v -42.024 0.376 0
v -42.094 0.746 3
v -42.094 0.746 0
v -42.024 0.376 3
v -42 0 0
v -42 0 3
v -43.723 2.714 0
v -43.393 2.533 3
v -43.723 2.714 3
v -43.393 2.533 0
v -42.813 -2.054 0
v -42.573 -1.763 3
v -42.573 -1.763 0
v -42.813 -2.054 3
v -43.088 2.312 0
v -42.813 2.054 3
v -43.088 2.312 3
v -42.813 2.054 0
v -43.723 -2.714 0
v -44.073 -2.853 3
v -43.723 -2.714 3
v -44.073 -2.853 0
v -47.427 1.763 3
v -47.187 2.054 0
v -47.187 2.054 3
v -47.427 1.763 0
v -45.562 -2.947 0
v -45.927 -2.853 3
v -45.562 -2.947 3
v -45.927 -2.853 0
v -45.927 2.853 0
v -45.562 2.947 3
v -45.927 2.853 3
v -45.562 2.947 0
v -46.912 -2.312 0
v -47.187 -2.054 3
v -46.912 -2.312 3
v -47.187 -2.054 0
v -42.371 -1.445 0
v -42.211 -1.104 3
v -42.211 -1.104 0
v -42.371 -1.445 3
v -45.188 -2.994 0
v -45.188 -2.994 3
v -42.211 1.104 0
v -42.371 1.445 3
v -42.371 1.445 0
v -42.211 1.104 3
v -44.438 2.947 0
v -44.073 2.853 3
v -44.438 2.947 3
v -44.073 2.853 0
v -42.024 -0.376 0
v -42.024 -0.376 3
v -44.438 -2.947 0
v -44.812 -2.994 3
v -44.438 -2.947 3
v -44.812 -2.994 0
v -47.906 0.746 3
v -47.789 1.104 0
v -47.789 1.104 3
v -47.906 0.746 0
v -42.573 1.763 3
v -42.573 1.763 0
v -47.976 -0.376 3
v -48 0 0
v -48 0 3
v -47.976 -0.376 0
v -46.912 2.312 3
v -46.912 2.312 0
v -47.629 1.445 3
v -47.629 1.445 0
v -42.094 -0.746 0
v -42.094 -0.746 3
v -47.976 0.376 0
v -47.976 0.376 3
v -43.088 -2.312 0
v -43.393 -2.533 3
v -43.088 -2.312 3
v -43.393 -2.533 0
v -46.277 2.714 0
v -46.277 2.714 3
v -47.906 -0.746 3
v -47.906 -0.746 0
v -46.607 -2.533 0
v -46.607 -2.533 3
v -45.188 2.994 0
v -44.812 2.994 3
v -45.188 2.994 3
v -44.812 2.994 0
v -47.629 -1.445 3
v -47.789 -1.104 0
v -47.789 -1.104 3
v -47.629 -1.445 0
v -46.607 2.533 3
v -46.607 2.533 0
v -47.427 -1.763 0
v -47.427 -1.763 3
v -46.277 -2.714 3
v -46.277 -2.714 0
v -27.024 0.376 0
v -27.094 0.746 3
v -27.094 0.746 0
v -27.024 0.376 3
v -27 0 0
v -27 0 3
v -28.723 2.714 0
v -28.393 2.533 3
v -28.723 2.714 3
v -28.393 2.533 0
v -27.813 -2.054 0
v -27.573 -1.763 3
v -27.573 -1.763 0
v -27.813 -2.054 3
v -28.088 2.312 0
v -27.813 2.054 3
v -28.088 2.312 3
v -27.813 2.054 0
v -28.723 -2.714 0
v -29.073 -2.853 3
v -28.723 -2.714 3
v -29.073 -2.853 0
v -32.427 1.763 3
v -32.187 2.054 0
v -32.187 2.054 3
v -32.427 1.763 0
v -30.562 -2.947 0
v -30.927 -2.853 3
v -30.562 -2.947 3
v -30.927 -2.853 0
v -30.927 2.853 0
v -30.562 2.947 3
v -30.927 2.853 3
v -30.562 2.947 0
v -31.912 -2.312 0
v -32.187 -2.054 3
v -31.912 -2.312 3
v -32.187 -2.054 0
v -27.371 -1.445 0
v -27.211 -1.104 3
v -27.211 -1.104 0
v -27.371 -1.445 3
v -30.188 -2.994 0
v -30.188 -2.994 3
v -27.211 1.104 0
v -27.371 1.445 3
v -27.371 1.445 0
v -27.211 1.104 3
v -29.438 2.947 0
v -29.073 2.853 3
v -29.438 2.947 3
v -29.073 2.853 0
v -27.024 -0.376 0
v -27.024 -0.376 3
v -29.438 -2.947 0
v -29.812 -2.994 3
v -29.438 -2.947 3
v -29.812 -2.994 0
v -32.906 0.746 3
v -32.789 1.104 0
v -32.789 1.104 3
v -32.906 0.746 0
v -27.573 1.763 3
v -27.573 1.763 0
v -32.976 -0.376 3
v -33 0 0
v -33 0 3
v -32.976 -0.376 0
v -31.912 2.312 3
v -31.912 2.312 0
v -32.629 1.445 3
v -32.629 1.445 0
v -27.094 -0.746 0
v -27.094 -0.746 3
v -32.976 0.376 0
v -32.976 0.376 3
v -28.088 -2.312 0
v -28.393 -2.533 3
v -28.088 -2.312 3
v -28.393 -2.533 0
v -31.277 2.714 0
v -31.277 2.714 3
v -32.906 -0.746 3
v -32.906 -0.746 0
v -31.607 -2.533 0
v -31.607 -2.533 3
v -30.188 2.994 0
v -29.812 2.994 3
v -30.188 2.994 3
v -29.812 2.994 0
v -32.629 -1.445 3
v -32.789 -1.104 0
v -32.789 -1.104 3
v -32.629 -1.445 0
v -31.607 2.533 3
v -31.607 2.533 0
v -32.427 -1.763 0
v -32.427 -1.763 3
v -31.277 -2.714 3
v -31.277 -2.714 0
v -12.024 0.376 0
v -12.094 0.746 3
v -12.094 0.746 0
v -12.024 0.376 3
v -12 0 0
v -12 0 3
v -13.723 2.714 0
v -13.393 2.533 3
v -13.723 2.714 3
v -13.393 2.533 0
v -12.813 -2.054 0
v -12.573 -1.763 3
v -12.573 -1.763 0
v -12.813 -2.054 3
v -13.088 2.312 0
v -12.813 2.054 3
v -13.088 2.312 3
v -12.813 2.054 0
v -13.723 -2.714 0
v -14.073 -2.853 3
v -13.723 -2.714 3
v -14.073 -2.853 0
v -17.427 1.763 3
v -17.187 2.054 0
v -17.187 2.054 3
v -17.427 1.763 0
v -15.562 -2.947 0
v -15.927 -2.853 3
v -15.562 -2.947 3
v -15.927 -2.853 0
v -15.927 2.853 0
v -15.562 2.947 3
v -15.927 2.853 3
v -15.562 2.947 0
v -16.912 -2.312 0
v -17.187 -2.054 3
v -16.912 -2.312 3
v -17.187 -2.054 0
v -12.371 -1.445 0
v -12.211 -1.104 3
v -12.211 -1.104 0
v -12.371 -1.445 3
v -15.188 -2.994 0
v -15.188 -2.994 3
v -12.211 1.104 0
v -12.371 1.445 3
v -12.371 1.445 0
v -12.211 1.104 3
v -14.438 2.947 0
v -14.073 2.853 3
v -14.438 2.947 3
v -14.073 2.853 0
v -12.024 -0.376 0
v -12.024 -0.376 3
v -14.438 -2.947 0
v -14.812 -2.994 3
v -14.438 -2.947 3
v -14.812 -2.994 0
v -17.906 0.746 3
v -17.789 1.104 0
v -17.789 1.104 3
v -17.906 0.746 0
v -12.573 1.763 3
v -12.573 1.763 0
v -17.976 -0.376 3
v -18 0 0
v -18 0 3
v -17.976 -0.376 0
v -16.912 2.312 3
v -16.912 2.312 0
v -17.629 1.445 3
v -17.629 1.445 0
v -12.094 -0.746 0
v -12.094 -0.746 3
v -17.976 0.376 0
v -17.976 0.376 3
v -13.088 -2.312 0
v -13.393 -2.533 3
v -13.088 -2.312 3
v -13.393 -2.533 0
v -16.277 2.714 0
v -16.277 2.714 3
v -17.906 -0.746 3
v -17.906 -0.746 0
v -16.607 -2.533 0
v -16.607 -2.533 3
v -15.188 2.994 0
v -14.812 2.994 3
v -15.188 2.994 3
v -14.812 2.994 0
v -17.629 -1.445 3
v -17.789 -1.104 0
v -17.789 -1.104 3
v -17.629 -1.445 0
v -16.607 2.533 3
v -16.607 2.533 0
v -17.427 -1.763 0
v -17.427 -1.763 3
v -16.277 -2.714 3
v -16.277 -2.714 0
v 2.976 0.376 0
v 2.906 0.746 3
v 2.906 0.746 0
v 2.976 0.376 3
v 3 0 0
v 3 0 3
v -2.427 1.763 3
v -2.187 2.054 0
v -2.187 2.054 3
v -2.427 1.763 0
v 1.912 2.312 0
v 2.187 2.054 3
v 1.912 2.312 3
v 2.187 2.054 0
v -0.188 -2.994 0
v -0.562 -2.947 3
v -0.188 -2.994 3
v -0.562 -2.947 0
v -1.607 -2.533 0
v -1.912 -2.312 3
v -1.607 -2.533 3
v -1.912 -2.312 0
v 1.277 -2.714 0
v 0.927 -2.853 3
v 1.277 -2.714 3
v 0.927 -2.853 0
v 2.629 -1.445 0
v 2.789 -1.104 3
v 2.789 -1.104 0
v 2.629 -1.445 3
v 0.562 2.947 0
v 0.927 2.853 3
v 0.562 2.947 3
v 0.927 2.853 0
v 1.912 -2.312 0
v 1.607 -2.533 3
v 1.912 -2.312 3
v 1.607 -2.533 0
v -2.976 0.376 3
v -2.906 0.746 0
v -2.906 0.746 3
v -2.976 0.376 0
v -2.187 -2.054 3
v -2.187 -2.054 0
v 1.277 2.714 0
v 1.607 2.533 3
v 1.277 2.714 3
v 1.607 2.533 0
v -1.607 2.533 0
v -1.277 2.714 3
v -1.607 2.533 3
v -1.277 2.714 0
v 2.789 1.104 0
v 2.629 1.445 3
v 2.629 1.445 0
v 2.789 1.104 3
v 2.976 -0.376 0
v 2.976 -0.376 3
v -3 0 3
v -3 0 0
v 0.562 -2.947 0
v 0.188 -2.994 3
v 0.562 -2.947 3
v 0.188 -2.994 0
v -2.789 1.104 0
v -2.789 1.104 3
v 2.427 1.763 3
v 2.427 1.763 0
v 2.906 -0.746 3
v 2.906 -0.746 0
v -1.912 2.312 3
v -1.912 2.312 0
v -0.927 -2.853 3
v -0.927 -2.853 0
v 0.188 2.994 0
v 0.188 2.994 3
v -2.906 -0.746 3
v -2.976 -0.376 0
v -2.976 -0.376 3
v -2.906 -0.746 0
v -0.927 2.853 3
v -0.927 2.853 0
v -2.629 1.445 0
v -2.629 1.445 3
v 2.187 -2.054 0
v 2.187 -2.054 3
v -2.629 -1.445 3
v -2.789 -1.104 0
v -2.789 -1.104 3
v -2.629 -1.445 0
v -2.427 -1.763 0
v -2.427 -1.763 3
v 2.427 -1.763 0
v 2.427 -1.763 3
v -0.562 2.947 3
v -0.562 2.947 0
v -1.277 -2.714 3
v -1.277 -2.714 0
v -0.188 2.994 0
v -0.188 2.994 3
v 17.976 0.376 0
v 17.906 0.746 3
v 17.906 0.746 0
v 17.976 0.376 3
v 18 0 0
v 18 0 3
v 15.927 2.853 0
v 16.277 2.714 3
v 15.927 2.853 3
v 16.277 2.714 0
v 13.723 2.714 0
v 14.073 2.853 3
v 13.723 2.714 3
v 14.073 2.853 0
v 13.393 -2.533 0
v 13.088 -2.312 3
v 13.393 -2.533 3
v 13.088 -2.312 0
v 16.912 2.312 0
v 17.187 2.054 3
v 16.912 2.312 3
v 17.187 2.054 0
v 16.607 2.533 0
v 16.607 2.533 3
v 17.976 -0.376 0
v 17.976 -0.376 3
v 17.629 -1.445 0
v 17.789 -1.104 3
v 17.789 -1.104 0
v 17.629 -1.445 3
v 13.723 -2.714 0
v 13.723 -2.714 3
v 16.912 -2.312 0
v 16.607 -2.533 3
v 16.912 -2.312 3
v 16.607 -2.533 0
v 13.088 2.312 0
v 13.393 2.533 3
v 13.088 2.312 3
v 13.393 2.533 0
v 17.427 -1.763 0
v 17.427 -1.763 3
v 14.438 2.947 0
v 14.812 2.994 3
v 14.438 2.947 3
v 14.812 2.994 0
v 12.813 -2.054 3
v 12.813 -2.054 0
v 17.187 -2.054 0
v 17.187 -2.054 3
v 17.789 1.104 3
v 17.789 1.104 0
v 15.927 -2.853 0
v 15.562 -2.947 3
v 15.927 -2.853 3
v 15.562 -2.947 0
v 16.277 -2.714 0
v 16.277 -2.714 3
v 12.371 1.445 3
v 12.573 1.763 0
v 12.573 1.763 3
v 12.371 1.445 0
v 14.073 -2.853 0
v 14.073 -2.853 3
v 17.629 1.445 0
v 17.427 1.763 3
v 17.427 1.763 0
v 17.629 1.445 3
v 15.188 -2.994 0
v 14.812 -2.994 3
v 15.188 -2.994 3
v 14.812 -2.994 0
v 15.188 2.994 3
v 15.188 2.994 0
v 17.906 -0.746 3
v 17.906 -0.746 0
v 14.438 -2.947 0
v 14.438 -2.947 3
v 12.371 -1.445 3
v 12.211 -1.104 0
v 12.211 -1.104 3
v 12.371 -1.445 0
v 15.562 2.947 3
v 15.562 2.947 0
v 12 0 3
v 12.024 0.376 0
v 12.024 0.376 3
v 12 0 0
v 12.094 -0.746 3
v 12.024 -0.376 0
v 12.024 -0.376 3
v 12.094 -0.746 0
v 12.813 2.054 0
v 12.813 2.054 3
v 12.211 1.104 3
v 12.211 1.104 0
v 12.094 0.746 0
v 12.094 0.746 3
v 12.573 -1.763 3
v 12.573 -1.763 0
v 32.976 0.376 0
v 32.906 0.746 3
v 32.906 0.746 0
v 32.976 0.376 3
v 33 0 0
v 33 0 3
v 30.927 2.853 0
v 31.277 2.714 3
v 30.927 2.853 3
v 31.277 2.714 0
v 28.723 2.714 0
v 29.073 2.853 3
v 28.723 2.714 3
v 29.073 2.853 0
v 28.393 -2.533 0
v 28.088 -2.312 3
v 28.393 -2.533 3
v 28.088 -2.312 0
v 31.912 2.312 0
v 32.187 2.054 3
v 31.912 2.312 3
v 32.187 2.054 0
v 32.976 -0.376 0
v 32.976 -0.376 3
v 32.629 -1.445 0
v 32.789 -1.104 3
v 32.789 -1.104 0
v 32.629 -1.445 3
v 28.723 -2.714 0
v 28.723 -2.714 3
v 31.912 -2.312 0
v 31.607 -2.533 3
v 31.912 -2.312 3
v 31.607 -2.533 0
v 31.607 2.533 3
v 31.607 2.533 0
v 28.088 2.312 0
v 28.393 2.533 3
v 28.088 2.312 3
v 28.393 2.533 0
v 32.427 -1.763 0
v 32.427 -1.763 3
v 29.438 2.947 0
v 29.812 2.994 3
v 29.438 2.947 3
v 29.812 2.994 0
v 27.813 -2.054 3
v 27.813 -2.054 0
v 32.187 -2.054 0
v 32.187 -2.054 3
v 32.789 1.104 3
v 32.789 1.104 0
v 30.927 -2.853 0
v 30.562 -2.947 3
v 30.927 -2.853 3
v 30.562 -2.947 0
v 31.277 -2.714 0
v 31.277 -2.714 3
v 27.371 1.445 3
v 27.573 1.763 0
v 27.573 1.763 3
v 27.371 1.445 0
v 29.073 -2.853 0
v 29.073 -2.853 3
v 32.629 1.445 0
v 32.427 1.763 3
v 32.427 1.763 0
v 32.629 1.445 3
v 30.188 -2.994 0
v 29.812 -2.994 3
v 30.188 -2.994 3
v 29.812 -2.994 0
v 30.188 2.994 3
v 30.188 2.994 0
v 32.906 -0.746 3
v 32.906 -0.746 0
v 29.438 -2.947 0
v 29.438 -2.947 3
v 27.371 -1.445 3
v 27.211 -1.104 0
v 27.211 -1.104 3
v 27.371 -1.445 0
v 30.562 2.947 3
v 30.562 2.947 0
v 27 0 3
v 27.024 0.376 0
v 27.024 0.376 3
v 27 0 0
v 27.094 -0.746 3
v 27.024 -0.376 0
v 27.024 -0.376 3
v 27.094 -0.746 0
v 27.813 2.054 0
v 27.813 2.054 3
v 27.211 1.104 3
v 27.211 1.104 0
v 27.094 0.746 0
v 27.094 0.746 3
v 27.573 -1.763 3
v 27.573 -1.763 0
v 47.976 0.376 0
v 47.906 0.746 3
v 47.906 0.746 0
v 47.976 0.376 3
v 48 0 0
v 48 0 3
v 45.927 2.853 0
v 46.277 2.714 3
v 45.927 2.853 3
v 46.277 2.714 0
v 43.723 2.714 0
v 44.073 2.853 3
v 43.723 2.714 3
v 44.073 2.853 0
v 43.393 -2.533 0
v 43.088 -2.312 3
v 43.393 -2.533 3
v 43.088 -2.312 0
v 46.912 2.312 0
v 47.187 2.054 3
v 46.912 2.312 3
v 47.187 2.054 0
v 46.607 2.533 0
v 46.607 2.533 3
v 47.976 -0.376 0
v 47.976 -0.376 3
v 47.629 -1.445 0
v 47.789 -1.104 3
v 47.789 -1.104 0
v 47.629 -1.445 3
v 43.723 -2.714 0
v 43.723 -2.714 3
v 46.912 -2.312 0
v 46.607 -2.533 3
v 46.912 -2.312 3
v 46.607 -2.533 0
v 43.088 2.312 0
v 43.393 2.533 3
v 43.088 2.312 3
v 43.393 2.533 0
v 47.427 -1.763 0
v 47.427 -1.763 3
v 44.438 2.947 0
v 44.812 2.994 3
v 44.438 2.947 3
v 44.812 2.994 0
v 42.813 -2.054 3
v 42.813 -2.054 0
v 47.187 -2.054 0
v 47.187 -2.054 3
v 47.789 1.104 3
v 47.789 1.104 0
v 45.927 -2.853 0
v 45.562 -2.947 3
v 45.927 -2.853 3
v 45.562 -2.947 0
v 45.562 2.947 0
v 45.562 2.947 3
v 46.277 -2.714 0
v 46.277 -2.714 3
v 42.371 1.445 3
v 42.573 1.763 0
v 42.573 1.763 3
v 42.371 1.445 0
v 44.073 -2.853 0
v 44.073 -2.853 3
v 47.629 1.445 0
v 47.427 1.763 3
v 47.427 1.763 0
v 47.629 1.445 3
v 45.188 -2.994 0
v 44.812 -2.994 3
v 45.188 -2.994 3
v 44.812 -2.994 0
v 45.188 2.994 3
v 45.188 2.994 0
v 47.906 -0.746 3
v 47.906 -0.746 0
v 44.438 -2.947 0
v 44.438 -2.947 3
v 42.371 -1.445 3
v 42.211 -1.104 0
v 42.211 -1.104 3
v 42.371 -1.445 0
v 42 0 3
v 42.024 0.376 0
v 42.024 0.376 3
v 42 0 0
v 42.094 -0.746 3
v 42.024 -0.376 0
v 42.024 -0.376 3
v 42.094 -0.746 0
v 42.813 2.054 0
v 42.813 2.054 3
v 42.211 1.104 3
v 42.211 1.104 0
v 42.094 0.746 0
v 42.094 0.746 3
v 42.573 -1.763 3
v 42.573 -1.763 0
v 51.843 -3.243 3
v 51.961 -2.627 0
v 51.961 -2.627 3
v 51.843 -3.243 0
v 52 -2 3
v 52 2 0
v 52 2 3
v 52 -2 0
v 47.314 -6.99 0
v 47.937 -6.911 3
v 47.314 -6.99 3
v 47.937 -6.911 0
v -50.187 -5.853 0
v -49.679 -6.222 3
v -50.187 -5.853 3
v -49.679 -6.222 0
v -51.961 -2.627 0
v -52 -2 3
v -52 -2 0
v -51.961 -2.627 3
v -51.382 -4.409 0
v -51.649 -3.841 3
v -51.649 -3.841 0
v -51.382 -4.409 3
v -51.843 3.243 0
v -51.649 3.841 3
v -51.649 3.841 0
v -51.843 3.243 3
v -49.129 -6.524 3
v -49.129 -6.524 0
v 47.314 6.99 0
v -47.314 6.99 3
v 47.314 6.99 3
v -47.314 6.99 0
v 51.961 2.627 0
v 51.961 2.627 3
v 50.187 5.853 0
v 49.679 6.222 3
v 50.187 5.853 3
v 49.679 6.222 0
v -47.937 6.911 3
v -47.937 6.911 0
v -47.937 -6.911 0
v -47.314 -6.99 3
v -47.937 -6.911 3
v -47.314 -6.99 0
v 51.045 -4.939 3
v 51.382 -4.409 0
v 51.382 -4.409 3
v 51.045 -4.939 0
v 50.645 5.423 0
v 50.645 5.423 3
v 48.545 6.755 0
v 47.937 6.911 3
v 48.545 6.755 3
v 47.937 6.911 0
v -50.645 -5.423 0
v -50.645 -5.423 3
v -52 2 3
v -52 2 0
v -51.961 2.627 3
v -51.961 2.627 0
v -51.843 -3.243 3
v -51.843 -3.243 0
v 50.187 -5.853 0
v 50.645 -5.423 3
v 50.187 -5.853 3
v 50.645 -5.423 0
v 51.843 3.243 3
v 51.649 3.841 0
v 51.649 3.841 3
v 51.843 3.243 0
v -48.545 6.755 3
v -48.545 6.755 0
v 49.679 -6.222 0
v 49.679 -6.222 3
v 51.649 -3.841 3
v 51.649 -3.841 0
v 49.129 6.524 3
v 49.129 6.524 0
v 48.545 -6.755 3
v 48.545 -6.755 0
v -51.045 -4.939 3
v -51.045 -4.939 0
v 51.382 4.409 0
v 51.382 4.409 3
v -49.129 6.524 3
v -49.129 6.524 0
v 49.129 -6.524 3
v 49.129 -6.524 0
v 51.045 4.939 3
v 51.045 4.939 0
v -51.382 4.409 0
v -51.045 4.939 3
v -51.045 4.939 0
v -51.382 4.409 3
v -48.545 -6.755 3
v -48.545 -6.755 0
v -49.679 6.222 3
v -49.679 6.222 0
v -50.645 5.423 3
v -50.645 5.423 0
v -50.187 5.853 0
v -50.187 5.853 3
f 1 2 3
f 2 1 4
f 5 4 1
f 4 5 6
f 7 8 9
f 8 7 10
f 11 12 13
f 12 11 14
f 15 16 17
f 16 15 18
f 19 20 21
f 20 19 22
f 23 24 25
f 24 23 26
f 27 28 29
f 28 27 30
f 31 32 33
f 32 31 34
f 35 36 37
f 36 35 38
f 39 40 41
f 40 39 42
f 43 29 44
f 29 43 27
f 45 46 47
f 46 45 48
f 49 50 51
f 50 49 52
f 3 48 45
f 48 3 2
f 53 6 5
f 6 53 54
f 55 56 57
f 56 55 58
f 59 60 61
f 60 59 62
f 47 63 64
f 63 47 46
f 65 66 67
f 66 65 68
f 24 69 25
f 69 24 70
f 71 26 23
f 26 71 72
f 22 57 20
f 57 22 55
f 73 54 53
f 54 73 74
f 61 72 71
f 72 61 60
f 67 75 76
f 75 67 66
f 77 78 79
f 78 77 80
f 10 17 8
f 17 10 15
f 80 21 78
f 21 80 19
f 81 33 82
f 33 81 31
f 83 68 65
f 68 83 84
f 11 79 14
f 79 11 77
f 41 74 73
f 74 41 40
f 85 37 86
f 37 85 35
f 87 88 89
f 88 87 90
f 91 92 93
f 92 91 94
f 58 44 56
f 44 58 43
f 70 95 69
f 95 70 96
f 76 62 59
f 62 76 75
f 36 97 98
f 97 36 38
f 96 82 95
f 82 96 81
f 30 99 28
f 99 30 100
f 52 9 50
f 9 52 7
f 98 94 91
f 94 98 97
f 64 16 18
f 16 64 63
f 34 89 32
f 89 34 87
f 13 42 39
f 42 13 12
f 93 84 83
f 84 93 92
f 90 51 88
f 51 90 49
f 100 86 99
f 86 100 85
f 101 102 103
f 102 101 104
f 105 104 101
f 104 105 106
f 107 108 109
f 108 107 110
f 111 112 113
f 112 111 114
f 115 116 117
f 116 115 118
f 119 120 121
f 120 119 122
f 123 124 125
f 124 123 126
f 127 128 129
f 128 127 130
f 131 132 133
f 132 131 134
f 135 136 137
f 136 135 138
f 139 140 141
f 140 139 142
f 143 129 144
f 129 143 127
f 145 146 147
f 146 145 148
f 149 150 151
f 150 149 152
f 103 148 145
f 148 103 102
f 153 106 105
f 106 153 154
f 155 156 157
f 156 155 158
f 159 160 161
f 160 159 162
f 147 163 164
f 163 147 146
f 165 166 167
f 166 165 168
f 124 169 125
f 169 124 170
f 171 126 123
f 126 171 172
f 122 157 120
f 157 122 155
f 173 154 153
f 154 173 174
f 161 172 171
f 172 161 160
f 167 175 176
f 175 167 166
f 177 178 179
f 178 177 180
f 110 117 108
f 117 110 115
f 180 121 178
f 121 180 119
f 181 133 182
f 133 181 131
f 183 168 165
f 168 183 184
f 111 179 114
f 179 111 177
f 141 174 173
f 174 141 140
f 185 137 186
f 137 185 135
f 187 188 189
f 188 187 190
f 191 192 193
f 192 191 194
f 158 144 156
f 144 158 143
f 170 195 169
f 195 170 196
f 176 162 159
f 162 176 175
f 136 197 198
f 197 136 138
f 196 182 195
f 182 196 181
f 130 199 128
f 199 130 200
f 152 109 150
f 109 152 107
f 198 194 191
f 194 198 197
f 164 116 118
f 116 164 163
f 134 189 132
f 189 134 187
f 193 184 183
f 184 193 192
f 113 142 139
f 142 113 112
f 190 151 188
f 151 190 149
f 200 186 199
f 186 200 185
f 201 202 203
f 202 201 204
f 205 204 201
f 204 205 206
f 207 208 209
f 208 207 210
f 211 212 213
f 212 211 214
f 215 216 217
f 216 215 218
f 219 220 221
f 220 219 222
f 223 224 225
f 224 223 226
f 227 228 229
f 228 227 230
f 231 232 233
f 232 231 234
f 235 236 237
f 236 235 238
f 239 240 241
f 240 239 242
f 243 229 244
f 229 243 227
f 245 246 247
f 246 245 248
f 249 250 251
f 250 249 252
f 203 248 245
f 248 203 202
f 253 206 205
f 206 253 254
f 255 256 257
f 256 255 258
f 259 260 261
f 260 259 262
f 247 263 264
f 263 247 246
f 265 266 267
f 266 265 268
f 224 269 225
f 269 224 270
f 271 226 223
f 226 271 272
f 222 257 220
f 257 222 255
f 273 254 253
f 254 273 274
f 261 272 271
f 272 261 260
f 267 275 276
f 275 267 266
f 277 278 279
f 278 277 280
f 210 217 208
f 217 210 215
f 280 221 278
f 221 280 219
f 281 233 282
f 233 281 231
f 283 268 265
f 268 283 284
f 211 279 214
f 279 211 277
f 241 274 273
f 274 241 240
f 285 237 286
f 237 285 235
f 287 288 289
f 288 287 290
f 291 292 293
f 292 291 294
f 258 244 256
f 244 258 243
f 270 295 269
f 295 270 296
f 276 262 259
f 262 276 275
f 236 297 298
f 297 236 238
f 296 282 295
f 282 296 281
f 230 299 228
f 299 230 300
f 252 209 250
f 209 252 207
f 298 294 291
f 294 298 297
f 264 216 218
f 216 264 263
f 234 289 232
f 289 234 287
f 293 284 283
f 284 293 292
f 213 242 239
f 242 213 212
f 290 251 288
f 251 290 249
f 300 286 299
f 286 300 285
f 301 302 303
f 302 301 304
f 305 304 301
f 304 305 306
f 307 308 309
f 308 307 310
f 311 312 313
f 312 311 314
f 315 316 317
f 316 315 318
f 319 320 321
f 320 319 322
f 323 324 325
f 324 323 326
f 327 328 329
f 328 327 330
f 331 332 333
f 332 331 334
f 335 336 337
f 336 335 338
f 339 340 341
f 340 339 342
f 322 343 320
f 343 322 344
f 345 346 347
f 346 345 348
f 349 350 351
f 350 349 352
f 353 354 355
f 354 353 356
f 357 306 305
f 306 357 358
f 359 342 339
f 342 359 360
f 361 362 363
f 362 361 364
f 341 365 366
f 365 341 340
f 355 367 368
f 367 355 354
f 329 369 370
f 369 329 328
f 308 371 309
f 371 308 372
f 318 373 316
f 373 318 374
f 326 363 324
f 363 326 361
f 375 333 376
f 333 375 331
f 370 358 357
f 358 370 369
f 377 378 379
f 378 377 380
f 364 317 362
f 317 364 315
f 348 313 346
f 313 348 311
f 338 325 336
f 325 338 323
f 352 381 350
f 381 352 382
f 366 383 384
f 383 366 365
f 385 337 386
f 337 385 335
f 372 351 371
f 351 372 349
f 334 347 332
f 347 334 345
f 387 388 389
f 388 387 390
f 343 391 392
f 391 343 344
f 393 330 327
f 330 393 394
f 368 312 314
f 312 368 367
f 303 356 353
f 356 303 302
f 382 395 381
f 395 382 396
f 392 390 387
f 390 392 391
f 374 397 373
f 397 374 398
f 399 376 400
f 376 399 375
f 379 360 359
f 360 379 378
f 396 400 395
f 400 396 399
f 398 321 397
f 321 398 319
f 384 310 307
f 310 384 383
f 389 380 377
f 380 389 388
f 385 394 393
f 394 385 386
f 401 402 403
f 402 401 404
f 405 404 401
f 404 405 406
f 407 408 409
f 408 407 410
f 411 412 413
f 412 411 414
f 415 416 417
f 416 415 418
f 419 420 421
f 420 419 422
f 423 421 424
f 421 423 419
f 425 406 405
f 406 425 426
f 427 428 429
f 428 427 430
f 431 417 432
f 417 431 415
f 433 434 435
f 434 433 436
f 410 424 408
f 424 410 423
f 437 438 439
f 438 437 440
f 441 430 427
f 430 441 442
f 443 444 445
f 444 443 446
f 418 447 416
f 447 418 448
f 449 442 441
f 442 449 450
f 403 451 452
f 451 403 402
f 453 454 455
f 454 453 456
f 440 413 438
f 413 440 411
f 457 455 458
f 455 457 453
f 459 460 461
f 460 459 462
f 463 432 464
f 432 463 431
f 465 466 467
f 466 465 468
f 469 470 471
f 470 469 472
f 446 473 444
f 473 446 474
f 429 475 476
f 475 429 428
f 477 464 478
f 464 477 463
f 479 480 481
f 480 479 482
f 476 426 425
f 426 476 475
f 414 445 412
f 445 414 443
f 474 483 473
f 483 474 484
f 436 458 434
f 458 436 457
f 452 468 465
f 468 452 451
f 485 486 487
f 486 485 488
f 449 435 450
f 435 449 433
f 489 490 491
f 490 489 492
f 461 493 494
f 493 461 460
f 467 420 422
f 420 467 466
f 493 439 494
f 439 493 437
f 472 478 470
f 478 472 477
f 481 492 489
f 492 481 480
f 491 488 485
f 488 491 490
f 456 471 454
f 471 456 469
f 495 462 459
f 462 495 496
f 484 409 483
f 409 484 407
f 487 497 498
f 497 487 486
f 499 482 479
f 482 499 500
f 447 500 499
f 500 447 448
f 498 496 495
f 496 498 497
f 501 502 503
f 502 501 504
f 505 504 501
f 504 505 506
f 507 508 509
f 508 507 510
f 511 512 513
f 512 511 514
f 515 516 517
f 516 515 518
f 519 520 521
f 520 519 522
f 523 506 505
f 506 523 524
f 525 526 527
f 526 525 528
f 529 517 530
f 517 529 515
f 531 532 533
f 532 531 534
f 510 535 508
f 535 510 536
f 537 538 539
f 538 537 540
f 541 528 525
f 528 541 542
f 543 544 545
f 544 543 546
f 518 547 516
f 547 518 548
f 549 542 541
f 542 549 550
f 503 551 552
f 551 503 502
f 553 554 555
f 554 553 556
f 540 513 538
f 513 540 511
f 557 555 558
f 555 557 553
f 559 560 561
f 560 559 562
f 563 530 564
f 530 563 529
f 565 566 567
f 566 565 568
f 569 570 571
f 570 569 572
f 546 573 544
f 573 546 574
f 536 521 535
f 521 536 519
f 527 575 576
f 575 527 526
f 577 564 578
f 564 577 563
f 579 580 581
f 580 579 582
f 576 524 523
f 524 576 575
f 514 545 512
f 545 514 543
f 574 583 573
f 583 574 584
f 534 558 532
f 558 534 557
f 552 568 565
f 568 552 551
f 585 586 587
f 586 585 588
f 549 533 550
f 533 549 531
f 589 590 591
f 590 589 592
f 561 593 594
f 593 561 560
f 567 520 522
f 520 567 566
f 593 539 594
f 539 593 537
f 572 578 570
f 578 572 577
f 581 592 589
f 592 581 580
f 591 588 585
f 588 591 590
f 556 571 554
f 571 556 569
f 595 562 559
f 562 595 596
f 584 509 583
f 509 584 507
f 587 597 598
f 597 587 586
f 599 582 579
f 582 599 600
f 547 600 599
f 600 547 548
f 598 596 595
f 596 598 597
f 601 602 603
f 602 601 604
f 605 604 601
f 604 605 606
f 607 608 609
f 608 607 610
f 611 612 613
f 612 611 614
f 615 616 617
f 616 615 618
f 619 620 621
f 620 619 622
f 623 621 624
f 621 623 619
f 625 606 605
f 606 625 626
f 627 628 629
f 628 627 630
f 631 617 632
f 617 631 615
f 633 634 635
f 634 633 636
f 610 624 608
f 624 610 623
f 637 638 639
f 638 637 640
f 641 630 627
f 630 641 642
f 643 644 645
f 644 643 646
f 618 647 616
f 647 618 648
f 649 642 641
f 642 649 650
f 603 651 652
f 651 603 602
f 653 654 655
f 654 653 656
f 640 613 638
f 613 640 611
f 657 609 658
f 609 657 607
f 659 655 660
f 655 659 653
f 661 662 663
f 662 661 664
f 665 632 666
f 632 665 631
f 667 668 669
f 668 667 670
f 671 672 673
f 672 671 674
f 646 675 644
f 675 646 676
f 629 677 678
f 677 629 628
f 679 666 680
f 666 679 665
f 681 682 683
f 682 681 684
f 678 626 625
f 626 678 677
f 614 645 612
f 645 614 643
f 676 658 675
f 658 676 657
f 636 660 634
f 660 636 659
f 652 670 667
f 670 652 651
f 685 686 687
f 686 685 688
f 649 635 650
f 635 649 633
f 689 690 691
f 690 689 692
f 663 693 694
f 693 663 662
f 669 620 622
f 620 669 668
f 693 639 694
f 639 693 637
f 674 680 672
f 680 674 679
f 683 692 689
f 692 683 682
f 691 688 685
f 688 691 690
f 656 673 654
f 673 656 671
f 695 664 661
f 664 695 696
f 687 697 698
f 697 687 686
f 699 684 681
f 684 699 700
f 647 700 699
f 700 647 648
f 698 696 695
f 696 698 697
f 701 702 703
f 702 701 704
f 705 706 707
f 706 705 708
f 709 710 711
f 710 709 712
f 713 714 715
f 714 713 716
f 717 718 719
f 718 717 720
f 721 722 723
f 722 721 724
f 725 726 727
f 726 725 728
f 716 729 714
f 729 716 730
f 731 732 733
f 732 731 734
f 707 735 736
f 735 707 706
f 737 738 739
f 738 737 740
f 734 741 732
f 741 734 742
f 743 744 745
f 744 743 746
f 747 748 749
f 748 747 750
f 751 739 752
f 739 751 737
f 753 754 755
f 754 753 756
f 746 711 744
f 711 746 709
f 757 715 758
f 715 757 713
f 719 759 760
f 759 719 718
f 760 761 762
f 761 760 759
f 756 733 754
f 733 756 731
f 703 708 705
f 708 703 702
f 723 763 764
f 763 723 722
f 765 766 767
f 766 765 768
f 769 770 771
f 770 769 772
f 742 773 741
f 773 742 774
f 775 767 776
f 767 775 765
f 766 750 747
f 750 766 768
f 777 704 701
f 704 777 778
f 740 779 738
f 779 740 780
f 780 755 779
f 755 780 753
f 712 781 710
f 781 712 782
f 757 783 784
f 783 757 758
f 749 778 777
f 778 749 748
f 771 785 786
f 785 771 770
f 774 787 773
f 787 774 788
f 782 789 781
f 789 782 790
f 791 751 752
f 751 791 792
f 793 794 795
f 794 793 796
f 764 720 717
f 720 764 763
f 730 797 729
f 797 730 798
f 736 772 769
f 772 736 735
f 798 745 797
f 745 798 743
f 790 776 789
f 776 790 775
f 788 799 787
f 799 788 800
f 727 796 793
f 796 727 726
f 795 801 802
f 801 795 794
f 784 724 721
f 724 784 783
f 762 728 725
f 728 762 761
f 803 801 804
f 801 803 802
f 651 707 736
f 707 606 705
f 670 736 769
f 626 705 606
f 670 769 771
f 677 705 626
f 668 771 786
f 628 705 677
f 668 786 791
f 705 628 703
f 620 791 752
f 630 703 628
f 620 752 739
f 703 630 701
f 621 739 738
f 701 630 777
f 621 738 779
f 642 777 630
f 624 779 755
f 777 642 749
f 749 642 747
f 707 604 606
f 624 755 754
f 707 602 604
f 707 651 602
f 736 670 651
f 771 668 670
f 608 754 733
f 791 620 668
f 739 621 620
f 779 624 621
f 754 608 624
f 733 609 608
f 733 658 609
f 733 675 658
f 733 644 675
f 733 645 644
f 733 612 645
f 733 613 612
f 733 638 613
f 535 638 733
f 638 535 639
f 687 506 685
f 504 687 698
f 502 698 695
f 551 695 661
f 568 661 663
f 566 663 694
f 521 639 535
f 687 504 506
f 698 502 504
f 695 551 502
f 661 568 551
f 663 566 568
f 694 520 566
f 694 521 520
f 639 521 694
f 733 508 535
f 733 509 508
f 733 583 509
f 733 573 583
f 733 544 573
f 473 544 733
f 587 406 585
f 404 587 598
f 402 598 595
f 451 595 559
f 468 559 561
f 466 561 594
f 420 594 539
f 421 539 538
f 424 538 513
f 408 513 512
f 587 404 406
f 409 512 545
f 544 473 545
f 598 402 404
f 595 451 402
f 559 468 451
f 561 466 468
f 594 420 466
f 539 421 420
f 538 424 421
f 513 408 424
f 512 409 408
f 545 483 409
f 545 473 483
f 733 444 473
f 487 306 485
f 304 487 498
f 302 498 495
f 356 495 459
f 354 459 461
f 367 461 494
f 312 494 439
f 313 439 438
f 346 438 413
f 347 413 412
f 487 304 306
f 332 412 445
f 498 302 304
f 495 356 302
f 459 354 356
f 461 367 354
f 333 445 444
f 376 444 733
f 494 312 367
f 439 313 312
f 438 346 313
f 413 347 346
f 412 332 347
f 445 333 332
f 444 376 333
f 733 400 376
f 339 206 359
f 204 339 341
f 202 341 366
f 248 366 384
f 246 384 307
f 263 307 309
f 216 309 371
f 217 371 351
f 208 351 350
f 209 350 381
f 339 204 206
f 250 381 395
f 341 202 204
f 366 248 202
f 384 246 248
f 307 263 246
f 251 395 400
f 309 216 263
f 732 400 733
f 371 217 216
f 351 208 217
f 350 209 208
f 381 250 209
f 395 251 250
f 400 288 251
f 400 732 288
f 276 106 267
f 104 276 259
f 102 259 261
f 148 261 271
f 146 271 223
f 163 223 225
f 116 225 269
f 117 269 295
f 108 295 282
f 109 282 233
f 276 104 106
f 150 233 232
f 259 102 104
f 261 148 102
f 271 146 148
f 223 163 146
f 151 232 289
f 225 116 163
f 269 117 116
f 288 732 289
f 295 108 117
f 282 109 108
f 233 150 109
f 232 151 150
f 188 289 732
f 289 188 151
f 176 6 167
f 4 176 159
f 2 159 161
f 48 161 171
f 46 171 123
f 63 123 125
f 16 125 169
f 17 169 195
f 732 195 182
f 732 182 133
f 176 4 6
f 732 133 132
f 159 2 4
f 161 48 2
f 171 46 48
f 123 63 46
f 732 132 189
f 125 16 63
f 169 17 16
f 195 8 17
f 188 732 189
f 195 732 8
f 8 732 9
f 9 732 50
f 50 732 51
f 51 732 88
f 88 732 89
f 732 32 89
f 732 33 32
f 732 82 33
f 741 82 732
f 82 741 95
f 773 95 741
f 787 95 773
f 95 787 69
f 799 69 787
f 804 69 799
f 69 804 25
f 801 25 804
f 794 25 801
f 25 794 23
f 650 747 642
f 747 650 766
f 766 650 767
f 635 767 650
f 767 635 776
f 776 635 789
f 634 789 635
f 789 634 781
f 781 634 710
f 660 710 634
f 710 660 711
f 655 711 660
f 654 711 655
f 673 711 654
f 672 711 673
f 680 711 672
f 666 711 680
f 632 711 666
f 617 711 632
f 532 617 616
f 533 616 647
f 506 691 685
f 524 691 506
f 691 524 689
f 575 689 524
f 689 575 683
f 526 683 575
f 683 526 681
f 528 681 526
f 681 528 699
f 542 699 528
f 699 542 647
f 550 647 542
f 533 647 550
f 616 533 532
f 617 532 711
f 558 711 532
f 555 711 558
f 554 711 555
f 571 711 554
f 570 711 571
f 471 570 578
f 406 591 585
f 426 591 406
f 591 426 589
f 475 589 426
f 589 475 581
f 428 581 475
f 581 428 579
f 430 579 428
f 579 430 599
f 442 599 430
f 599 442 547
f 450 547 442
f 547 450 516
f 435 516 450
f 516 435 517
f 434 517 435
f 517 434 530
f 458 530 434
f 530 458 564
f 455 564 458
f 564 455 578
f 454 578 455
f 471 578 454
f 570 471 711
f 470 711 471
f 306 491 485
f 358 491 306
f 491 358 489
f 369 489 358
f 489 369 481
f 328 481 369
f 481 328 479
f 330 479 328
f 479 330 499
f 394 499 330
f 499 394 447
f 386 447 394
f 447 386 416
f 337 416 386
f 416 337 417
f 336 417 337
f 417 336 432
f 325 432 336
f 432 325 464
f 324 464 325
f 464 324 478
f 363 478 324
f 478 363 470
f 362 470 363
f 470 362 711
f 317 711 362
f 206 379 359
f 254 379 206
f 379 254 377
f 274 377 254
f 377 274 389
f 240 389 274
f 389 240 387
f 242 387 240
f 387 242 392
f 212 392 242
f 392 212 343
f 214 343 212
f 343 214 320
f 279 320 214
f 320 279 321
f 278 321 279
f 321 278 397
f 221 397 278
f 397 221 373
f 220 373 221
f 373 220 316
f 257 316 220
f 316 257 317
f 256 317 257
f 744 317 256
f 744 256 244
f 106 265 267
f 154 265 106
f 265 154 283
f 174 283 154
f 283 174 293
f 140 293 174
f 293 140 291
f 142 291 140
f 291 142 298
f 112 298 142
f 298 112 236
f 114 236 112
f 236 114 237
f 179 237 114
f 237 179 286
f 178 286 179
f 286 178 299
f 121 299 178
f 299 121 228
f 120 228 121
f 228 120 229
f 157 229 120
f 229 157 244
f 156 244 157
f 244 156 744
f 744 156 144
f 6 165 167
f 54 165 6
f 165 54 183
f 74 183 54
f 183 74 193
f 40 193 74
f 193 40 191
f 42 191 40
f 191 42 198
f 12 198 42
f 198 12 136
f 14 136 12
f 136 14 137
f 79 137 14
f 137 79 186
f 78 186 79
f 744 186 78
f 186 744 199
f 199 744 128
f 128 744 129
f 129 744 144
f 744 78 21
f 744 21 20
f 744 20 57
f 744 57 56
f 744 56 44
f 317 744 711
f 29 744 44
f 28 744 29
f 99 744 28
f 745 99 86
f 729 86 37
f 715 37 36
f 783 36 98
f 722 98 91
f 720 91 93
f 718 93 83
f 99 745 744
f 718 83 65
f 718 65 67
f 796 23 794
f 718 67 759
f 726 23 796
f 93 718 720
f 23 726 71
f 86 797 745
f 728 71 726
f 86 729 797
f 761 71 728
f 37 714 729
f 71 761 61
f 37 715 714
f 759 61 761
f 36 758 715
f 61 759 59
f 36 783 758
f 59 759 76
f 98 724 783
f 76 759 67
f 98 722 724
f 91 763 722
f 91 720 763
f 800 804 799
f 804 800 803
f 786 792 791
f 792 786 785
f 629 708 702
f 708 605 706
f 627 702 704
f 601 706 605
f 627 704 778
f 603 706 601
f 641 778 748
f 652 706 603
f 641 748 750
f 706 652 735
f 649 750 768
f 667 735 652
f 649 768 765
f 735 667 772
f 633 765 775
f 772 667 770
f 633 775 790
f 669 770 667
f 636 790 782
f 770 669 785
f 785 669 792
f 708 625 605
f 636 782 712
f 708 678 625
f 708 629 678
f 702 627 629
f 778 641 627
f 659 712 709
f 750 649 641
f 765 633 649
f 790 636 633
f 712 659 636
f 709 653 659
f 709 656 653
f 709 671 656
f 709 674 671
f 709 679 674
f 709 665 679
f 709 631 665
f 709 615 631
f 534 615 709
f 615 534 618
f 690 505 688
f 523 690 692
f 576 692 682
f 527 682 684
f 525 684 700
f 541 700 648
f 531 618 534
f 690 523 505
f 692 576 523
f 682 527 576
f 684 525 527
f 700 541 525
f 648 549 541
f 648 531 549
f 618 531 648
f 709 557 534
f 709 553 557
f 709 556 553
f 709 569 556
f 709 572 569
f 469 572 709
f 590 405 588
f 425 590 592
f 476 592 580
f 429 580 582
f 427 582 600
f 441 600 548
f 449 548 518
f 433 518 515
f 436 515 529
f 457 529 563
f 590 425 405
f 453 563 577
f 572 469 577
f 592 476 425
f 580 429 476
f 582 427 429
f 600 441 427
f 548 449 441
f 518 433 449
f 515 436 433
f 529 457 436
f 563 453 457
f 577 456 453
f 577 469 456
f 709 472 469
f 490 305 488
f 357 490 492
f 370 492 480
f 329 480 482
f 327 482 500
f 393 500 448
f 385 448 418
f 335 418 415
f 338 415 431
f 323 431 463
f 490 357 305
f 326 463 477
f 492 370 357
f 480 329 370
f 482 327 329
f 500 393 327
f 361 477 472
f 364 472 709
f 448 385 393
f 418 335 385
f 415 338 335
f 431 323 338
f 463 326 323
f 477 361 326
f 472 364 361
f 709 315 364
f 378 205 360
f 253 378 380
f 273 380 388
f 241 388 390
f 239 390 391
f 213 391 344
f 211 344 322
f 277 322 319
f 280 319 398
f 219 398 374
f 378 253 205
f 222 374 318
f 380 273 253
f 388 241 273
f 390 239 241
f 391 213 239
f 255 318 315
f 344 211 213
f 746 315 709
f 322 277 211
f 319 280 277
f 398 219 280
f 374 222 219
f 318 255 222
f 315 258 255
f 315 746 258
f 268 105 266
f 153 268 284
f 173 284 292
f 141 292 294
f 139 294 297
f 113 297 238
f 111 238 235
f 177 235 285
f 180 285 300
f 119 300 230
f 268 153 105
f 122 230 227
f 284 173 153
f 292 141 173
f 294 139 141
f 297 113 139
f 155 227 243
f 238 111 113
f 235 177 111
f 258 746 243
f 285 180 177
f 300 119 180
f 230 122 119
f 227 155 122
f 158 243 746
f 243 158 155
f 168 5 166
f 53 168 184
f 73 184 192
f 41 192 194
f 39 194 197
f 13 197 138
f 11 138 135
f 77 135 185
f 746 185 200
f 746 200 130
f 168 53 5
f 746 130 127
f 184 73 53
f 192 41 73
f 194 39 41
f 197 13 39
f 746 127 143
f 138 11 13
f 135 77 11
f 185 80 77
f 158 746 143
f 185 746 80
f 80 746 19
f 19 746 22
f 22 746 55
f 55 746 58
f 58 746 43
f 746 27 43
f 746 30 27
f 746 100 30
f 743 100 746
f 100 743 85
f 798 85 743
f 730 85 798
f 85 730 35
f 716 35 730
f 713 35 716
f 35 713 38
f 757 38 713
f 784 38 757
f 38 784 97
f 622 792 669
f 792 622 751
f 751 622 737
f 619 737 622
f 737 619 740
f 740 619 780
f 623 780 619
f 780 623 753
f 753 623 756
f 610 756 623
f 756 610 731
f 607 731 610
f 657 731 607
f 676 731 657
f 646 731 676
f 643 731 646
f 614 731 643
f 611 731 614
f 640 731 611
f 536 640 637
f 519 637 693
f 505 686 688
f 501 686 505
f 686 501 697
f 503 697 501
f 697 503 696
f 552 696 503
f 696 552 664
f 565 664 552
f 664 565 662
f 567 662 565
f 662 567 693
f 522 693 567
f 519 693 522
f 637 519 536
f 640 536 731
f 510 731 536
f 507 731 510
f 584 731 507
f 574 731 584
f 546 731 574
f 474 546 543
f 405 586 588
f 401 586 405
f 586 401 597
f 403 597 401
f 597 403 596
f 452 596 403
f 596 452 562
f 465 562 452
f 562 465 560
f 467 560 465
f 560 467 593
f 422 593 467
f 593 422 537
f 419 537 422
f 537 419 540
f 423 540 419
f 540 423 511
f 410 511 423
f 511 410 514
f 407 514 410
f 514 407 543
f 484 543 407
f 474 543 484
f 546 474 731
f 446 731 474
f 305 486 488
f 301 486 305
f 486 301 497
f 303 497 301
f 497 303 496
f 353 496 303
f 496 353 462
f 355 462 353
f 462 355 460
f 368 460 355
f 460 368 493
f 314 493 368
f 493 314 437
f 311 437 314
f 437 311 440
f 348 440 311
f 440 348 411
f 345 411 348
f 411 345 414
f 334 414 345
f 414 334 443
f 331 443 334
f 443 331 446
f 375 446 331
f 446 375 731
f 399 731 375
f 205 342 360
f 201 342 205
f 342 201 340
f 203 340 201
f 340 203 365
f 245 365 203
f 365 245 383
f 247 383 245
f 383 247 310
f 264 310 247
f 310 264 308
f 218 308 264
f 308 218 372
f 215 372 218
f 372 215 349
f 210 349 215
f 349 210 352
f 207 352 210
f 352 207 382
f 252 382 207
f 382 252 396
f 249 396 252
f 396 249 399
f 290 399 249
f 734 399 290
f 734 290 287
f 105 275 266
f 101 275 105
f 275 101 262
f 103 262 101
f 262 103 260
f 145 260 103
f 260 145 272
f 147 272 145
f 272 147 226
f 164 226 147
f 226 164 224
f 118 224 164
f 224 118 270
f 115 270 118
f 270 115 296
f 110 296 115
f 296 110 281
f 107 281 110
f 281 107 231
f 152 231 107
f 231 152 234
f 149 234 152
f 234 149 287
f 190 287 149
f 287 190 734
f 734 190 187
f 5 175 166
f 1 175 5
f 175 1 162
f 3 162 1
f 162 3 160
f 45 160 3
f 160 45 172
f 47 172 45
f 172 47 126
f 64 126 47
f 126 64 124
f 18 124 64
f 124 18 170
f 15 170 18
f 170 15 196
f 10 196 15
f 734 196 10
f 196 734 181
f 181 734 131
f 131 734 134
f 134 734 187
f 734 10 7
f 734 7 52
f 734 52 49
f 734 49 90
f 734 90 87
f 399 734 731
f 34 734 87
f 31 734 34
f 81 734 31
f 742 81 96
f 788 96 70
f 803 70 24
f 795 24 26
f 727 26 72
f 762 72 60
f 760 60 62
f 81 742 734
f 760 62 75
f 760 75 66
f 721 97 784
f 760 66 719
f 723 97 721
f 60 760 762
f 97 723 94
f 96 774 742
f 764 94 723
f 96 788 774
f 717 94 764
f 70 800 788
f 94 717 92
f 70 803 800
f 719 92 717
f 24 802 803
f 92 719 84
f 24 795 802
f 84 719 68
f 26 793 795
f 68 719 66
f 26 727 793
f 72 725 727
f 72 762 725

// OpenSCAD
$fn = 50;


difference() {
	union() {
		translate(v = [0, 0, 0]) {
			rotate(a = [0, 0, 0]) {
				hull() {
					translate(v = [-47.0000000000, 2.0000000000, 0]) {
						rotate(a = [0, 0, 0]) {
							translate(v = [0, 0, 0]) {
								rotate(a = [0, 0, 0]) {
									cylinder(h = 3, r = 5);
								}
							}
						}
					}
					translate(v = [47.0000000000, 2.0000000000, 0]) {
						rotate(a = [0, 0, 0]) {
							translate(v = [0, 0, 0]) {
								rotate(a = [0, 0, 0]) {
									cylinder(h = 3, r = 5);
								}
							}
						}
					}
					translate(v = [-47.0000000000, -2.0000000000, 0]) {
						rotate(a = [0, 0, 0]) {
							translate(v = [0, 0, 0]) {
								rotate(a = [0, 0, 0]) {
									cylinder(h = 3, r = 5);
								}
							}
						}
					}
					translate(v = [47.0000000000, -2.0000000000, 0]) {
						rotate(a = [0, 0, 0]) {
							translate(v = [0, 0, 0]) {
								rotate(a = [0, 0, 0]) {
									cylinder(h = 3, r = 5);
								}
							}
						}
					}
				}
			}
		}
	}
	union() {
		translate(v = [-45.0000000000, 0.0000000000, 0]) {
			rotate(a = [0, 0, 0]) {
				translate(v = [0, 0, -50]) {
					rotate(a = [0, 0, 0]) {
						cylinder(h = 100, r = 3.0000000000);
					}
				}
			}
		}
		translate(v = [-30.0000000000, 0.0000000000, 0]) {
			rotate(a = [0, 0, 0]) {
				translate(v = [0, 0, -50]) {
					rotate(a = [0, 0, 0]) {
						cylinder(h = 100, r = 3.0000000000);
					}
				}
			}
		}
		translate(v = [-15.0000000000, 0.0000000000, 0]) {
			rotate(a = [0, 0, 0]) {
				translate(v = [0, 0, -50]) {
					rotate(a = [0, 0, 0]) {
						cylinder(h = 100, r = 3.0000000000);
					}
				}
			}
		}
		translate(v = [0.0000000000, 0.0000000000, 0]) {
			rotate(a = [0, 0, 0]) {
				translate(v = [0, 0, -50]) {
					rotate(a = [0, 0, 0]) {
						cylinder(h = 100, r = 3.0000000000);
					}
				}
			}
		}
		translate(v = [15.0000000000, 0.0000000000, 0]) {
			rotate(a = [0, 0, 0]) {
				translate(v = [0, 0, -50]) {
					rotate(a = [0, 0, 0]) {
						cylinder(h = 100, r = 3.0000000000);
					}
				}
			}
		}
		translate(v = [30.0000000000, 0.0000000000, 0]) {
			rotate(a = [0, 0, 0]) {
				translate(v = [0, 0, -50]) {
					rotate(a = [0, 0, 0]) {
						cylinder(h = 100, r = 3.0000000000);
					}
				}
			}
		}
		translate(v = [45.0000000000, 0.0000000000, 0]) {
			rotate(a = [0, 0, 0]) {
				translate(v = [0, 0, -50]) {
					rotate(a = [0, 0, 0]) {
						cylinder(h = 100, r = 3.0000000000);
					}
				}
			}
		}
	}
}
